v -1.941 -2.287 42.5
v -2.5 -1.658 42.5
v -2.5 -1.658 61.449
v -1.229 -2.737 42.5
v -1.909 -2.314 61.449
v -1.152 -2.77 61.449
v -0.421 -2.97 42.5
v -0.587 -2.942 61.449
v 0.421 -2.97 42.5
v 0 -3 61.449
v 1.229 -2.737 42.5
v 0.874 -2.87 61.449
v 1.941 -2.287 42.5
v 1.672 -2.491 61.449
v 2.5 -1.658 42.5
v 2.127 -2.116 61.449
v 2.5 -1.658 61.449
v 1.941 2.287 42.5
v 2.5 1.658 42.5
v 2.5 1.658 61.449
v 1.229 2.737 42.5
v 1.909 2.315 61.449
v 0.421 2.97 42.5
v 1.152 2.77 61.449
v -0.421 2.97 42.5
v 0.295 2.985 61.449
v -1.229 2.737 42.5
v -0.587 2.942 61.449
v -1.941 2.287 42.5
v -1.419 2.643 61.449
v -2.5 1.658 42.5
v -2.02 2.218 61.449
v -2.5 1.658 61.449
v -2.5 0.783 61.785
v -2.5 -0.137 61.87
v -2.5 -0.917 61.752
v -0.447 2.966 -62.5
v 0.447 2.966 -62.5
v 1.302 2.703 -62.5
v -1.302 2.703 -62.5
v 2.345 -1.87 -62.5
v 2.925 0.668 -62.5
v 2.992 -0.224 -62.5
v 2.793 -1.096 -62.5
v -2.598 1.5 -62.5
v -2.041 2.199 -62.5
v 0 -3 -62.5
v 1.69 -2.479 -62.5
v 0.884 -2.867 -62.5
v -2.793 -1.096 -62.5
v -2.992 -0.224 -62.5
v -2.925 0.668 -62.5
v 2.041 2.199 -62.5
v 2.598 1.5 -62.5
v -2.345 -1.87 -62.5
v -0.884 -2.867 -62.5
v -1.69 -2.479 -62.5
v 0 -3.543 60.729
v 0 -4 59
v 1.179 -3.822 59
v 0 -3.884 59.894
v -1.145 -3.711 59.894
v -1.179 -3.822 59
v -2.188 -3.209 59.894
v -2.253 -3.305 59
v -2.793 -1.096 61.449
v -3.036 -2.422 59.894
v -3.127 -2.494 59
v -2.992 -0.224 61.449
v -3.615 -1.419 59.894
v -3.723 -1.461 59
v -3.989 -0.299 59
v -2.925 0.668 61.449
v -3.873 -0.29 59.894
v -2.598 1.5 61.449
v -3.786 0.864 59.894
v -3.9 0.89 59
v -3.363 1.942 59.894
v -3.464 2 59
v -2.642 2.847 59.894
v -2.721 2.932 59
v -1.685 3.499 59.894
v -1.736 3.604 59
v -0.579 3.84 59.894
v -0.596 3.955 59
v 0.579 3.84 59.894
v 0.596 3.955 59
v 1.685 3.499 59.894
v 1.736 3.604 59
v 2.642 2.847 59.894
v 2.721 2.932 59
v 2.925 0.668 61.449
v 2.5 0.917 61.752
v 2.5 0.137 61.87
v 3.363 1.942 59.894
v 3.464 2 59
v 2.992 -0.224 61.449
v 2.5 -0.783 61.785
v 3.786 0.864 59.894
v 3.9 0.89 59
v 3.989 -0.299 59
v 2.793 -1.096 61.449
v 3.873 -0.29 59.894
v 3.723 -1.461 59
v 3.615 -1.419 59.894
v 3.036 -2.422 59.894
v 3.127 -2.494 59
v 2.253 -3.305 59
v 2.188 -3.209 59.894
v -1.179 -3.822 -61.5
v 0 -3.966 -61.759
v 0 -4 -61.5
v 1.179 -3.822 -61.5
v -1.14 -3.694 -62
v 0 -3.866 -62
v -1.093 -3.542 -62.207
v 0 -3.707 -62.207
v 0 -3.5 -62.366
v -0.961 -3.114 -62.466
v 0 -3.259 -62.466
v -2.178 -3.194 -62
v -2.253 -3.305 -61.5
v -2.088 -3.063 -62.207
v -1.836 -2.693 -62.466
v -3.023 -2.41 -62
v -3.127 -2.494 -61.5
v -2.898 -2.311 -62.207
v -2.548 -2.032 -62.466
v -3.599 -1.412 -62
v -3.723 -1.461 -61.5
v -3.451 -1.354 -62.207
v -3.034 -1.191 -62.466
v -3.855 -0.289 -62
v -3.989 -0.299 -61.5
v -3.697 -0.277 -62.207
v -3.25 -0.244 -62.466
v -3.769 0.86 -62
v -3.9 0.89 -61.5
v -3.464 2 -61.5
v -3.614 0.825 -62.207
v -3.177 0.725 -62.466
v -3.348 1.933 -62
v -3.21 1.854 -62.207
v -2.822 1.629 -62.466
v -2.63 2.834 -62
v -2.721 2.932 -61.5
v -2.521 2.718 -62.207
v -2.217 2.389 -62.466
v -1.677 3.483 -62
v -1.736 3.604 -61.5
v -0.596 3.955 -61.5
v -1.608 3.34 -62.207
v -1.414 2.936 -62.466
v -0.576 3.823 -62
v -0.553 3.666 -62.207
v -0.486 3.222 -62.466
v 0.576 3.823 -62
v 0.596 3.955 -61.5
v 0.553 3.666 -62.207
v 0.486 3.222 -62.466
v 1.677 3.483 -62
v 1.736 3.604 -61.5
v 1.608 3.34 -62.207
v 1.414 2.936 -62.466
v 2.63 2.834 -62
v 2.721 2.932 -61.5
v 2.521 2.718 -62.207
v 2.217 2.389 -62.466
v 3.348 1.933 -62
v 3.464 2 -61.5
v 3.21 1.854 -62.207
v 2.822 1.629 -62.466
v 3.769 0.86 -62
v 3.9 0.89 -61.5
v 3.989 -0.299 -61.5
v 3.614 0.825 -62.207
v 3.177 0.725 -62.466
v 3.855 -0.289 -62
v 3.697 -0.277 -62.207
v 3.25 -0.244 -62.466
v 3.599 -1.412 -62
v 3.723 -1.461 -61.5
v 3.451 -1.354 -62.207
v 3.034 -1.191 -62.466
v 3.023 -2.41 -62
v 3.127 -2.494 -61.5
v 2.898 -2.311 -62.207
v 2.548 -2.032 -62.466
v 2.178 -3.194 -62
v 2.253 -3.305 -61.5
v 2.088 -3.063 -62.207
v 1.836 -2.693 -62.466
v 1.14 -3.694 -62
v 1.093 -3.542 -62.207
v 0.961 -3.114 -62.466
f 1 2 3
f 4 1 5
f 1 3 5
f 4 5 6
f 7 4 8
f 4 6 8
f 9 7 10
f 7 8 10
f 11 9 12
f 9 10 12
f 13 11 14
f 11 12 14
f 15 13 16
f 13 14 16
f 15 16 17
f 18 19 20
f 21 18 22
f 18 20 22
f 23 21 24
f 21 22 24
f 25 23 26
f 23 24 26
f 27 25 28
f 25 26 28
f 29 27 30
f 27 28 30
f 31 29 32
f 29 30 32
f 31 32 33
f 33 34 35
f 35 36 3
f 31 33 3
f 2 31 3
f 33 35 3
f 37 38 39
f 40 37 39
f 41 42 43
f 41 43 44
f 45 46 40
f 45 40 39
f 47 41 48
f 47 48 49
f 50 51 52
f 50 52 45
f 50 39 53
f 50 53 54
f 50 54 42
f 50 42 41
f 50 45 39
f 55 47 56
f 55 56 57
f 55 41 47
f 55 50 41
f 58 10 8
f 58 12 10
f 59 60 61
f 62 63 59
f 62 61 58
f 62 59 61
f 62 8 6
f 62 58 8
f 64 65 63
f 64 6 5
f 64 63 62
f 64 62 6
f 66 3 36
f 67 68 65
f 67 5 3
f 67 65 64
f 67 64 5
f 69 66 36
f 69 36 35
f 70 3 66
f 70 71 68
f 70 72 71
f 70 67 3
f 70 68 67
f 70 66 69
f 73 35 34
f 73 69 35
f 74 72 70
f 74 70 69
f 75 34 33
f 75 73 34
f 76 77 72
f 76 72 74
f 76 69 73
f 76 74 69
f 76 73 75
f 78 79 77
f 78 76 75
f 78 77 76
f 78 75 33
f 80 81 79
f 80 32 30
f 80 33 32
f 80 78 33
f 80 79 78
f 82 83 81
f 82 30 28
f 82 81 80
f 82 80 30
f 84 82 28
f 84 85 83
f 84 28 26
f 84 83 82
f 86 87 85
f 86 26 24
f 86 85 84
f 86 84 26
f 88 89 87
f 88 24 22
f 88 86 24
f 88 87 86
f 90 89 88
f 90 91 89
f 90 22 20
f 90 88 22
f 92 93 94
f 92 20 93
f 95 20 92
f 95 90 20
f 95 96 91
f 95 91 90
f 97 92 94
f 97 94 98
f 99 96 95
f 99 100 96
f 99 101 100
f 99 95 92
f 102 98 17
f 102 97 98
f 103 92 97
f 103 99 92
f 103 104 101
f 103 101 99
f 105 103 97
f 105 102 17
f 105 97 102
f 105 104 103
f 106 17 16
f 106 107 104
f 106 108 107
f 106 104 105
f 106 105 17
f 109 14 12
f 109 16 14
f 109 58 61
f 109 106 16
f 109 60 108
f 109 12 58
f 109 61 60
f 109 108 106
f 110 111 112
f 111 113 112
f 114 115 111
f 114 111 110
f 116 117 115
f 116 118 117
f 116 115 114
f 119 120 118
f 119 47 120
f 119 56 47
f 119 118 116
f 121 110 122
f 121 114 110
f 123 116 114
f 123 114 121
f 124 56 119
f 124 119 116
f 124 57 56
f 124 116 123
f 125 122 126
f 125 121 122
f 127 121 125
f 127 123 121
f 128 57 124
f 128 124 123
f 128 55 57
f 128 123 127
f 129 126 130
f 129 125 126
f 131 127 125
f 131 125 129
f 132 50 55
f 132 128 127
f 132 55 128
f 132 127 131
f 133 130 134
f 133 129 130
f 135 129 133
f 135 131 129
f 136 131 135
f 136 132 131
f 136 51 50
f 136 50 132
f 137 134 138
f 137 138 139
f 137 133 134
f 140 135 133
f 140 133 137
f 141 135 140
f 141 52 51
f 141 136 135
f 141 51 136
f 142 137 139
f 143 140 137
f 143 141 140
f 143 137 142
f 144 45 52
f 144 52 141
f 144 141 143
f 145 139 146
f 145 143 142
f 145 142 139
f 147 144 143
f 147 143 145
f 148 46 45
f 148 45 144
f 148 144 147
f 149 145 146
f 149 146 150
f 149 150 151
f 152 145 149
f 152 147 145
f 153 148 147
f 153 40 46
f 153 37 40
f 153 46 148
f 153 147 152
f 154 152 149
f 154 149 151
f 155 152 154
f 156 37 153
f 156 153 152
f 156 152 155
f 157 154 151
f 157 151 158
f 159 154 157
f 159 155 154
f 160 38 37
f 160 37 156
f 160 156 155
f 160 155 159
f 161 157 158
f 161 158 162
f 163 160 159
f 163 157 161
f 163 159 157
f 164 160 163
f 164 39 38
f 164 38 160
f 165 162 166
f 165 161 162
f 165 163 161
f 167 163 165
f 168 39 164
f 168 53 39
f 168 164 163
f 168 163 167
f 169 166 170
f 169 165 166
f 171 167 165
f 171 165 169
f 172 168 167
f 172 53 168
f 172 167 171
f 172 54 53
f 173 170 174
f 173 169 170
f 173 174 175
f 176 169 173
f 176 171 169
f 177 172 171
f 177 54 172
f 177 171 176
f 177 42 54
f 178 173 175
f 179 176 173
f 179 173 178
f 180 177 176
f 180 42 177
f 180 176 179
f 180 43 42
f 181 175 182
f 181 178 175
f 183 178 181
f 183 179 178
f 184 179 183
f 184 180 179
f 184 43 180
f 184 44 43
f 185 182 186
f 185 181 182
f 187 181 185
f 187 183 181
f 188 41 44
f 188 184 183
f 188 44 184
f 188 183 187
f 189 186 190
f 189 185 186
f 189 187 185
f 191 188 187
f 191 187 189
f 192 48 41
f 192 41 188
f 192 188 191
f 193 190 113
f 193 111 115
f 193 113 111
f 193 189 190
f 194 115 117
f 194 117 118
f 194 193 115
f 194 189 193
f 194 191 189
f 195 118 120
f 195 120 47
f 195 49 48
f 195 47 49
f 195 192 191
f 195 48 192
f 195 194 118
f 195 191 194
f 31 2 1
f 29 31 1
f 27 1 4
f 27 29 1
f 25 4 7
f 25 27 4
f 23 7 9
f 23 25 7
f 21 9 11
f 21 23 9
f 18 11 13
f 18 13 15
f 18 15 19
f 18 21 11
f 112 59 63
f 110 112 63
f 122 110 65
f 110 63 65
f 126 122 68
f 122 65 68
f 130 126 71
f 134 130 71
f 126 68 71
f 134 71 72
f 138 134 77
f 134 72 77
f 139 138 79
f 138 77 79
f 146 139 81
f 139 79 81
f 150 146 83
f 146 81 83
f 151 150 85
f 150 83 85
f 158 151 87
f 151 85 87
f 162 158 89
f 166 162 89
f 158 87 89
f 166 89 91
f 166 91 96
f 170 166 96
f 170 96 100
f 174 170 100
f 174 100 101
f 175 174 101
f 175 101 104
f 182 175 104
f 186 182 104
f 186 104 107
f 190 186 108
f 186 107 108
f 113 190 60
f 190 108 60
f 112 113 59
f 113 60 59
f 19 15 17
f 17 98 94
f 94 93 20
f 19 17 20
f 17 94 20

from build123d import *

# Parameters (mm, degrees)
F0_W     = 4
F0_H     = 125
F3_DEPTH = 20
F5_R     = 1


# Not quite as in the source:
# - a fillet or chamfer that OpenCascade refuses, or shapes differently, is made with other operations: its cross-section is extruded or revolved along the edge and cut away or added


with BuildPart() as f1:
    # F0 (on Right) → F1 (revolve)
    with BuildSketch(Plane.YZ):
        with Locations((-2, 0)):
            Rectangle(F0_W, F0_H)
    revolve(axis=Axis((0, 0, 0), (0, 0, -1)))

    # F2 (on face) → F3 (cut)
    with BuildSketch(Plane.XY.offset(62.5)):
        with BuildLine():
            Line((-2.5, 1.6583123952), (-2.5, -1.6583123952))
            ThreePointArc((-2.5, -1.6583123952), (0, -3), (2.5, -1.6583123952))
            Line((2.5, -1.6583123952), (2.5, 1.6583123952))
            ThreePointArc((2.5, 1.6583123952), (0, 3), (-2.5, 1.6583123952))
        make_face()
    extrude(amount=-F3_DEPTH, mode=Mode.SUBTRACT)

    # F4: fillet of radius 3.5 on 1 edges, made by hand

    # F4_s1 → F4_t2 (revolve, cut)
    with BuildSketch(Plane.YZ):
        with BuildLine():
            ThreePointArc((-0.5, 62.5), (-2.9748737342, 61.4748737342), (-4, 59))
            Line((-4, 59), (-4, 62.5))
            Line((-4, 62.5), (-0.5, 62.5))
        make_face()
    revolve(axis=Axis((0, 0, 62.5), (0, 0, -1)), mode=Mode.SUBTRACT)

    # F5
    f5_edges = [f1.edges().sort_by_distance(p)[0] for p in [
        (0, 4, -62.5),
    ]]
    fillet(f5_edges, radius=F5_R)


solid = f1.part
